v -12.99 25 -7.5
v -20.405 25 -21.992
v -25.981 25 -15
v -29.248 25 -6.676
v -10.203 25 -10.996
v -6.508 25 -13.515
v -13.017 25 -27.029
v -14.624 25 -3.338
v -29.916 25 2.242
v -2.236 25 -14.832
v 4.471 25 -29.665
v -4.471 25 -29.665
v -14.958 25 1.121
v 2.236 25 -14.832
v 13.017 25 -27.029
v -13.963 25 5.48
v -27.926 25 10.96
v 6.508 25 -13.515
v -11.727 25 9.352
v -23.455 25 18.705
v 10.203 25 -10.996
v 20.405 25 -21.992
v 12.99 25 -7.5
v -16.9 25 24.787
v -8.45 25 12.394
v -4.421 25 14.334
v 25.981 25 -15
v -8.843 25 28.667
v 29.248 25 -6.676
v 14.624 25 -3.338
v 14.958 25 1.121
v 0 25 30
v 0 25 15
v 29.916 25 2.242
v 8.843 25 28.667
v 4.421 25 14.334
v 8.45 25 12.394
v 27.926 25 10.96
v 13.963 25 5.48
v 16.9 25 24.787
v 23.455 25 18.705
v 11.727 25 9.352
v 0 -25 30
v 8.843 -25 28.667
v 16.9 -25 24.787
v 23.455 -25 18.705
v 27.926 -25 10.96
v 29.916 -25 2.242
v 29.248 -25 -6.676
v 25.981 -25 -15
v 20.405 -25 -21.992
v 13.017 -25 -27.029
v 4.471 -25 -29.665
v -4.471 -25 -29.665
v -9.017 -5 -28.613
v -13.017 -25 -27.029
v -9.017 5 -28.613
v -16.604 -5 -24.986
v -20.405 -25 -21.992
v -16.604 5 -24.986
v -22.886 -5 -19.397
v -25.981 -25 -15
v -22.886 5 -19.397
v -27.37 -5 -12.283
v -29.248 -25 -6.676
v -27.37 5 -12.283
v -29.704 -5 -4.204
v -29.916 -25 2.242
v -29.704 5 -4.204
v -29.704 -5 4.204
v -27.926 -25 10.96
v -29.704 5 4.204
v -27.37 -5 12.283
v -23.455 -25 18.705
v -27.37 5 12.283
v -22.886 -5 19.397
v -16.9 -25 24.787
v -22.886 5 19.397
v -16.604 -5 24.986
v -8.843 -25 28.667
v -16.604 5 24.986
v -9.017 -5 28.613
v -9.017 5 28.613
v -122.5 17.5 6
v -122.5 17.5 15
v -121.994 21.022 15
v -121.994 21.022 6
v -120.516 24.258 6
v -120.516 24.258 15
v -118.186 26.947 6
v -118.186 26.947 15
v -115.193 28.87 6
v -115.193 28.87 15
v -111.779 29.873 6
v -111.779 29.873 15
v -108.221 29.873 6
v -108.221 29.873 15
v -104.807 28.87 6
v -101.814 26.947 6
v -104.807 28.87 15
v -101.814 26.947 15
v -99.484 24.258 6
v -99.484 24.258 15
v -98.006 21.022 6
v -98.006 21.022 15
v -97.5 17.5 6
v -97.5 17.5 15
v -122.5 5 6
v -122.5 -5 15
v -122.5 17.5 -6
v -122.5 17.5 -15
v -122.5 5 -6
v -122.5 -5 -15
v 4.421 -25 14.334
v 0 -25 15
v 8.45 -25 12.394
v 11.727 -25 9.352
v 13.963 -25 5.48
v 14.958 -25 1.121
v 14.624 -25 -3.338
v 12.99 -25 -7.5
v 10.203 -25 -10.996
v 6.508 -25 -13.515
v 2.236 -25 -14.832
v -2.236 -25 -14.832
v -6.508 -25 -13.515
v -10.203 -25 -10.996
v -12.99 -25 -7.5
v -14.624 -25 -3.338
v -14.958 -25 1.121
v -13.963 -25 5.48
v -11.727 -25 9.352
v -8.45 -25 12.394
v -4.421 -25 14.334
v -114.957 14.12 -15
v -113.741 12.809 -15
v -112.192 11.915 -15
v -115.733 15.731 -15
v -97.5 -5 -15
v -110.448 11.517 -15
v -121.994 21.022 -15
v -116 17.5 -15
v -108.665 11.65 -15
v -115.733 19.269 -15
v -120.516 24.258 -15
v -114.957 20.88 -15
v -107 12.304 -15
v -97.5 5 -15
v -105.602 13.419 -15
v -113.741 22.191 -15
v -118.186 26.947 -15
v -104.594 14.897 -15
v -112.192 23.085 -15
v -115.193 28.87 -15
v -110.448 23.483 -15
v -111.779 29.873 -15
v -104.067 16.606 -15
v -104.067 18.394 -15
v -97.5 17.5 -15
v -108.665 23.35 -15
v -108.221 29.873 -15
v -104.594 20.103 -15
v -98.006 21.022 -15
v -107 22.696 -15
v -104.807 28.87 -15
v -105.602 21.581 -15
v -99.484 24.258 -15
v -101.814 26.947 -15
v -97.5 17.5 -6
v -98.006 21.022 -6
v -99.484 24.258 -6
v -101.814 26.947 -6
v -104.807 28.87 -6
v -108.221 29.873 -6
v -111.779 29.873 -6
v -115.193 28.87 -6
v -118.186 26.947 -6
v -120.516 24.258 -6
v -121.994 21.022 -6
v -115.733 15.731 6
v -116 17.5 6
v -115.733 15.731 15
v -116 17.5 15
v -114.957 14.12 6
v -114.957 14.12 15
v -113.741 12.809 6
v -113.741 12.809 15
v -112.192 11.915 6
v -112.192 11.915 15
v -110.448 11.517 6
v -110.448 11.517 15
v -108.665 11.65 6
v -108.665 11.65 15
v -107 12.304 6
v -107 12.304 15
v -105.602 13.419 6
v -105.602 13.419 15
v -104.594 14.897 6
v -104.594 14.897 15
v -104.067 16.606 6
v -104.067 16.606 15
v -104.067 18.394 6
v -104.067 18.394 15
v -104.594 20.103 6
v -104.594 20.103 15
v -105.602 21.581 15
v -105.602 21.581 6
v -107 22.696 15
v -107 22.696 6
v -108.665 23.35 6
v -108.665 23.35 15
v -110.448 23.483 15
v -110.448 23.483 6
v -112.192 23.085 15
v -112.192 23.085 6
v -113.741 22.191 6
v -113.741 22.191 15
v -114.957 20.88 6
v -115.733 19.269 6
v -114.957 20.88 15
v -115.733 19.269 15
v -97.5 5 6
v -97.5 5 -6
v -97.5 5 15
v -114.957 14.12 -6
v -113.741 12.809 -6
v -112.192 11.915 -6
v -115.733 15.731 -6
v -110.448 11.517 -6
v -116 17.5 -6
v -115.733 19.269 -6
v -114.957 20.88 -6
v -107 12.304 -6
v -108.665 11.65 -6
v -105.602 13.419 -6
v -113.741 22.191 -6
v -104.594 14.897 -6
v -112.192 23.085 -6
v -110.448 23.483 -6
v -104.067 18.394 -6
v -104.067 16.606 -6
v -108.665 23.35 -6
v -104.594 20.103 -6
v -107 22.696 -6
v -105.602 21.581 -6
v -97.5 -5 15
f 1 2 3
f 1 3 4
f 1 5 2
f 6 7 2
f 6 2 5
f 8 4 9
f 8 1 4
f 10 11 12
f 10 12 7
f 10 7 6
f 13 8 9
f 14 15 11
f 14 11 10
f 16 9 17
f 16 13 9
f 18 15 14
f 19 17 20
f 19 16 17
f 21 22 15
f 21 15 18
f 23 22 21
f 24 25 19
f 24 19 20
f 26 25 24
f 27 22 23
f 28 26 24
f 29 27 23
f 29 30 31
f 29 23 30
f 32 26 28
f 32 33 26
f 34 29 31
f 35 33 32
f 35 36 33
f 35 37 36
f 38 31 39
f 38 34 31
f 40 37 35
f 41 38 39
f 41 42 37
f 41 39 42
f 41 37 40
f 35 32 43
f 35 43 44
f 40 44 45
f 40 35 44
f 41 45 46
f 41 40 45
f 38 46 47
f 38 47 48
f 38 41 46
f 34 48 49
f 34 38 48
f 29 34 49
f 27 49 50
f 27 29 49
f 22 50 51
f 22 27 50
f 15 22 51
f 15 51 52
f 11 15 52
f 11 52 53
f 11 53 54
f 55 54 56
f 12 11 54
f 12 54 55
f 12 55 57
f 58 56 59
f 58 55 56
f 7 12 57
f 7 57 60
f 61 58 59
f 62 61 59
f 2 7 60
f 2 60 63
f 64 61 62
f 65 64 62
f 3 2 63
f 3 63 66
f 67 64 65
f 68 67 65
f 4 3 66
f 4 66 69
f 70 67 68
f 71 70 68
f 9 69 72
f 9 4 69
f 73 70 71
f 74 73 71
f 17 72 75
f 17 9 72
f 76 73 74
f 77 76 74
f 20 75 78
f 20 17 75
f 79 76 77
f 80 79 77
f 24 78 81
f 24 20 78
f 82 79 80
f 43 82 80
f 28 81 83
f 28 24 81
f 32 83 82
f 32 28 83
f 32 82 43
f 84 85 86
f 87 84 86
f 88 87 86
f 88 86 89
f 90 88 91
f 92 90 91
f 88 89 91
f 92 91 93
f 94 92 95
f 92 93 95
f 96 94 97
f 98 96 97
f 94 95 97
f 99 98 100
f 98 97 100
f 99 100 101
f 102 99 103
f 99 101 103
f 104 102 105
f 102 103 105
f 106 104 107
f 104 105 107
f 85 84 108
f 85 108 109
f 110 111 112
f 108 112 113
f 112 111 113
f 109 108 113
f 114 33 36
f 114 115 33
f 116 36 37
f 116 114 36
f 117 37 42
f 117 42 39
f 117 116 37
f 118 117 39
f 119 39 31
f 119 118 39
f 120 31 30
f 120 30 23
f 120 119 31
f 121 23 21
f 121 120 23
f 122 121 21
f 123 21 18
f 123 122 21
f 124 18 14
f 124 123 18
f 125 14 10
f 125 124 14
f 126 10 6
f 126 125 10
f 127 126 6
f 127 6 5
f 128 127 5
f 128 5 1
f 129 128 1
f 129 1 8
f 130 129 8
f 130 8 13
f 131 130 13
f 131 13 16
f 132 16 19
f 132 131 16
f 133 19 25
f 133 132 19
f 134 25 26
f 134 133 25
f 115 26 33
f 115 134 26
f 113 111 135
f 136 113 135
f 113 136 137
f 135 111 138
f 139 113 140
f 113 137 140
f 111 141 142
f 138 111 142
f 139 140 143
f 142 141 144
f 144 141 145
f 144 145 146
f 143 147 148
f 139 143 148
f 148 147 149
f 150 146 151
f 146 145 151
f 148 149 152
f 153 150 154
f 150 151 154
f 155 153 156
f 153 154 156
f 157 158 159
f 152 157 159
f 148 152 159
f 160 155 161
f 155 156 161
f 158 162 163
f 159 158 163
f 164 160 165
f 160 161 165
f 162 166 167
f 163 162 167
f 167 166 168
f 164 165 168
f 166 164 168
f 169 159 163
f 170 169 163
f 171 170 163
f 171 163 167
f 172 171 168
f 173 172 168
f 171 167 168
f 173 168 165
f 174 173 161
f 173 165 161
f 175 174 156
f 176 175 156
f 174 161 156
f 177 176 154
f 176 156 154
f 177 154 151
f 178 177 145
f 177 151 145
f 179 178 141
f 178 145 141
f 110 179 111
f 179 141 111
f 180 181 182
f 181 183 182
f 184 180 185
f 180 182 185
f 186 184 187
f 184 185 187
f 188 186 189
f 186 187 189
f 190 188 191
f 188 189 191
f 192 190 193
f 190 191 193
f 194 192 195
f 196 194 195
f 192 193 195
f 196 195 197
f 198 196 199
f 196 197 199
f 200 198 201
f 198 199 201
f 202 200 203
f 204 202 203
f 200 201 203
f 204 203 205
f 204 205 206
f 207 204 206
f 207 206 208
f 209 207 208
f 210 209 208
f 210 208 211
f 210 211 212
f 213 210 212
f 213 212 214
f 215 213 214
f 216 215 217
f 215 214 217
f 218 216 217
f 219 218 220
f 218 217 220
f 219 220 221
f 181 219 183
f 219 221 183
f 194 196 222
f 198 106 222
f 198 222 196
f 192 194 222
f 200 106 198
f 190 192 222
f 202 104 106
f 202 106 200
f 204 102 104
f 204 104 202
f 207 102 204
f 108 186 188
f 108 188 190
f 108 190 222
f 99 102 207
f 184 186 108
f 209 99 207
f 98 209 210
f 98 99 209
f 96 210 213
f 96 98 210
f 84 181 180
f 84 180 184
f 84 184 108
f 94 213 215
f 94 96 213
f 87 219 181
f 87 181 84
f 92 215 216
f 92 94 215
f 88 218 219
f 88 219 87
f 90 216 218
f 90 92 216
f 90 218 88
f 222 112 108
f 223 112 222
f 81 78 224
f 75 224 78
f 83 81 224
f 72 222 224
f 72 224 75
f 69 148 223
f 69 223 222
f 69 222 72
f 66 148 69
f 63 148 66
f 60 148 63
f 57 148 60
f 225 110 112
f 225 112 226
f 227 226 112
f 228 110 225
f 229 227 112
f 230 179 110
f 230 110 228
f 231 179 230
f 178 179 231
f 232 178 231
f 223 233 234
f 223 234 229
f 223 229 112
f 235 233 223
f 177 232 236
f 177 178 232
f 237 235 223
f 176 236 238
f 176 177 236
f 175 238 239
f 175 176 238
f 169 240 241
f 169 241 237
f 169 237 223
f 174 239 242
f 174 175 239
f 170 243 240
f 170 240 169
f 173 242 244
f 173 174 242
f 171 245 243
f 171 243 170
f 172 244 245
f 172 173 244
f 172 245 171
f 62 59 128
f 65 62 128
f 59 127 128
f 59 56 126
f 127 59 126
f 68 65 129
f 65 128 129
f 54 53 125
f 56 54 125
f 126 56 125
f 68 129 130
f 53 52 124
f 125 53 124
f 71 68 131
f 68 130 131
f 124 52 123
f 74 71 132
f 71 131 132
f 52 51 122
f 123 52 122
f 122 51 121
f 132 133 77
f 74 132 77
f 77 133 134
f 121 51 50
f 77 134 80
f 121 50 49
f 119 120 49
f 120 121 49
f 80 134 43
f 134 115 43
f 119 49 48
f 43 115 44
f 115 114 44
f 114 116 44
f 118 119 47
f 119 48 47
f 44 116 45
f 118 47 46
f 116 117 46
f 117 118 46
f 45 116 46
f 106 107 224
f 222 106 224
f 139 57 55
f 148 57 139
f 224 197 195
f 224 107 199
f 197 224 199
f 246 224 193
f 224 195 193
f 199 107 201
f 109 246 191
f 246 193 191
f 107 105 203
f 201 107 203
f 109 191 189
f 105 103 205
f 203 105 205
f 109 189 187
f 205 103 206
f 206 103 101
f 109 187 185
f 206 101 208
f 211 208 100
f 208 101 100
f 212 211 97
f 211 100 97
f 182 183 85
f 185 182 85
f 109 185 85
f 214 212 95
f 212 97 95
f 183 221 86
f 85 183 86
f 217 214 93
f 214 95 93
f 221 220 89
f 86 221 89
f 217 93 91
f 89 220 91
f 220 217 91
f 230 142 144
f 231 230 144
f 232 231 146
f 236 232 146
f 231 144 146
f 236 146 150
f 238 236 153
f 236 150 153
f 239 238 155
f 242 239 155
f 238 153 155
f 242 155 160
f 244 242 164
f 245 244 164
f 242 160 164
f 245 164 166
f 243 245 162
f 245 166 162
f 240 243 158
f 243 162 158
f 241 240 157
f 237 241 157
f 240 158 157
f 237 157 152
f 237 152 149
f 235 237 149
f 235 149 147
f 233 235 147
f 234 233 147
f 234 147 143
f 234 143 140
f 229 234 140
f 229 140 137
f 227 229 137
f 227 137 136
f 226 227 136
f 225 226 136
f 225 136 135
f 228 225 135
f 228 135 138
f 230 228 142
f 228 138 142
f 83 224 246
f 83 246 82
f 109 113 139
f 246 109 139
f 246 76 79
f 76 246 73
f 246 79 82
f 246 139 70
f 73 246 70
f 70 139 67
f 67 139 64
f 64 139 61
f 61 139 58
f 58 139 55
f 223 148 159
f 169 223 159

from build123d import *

# Parameters (mm, degrees)
SKETCH1_R           = 30
SKETCH1_R_2         = 15
BOSS_EXTRUDE2_DEPTH = 25
BOSS_EXTRUDE3_DEPTH = 5
BOSS_EXTRUDE5_DEPTH = 9
SKETCH6_R           = 6
BOSS_EXTRUDE6_DEPTH = 9
SKETCH7_R           = 6
CUT_EXTRUDE2_DEPTH  = 46


with BuildPart() as part:
    # Sketch1 → Boss-Extrude2 (new body, symmetric)
    with BuildSketch(Plane(origin=(0, 0, 0), x_dir=(1, 0, 0), z_dir=(0, 1, 0))):
        with Locations(Location((0, 0, 0), (0, 0, 270))):  # turned: the seam where the file's is
            Circle(SKETCH1_R)
        with Locations(Location((0, 0, 0), (0, 0, 270))):  # turned: the seam where the file's is
            Circle(SKETCH1_R_2, mode=Mode.SUBTRACT)
    extrude(amount=BOSS_EXTRUDE2_DEPTH, both=True)

    # Sketch3 → Boss-Extrude3 (add, symmetric)
    with BuildSketch(Plane(origin=(0, 0, 0), x_dir=(1, 0, 0), z_dir=(0, 1, 0))):
        with BuildLine():
            Line((-97.5, 15), (-122.5, 15))
            Line((-122.5, 15), (-122.5, -15))
            Line((-122.5, -15), (-97.5, -15))
            Line((-97.5, -15), (-9.01734104, -28.612716763))
            ThreePointArc((-9.01734104, -28.612716763), (-30, 0), (-9.01734104, 28.612716763))
            Line((-9.01734104, 28.612716763), (-97.5, 15))
        make_face()
    extrude(amount=BOSS_EXTRUDE3_DEPTH, both=True)

    # Sketch4 → Boss-Extrude5 (add)
    with BuildSketch(Plane.XY.offset(15)):
        with BuildLine():
            Line((-122.5, 5), (-122.5, 17.5))
            ThreePointArc((-122.5, 17.5), (-110, 30), (-97.5, 17.5))
            Line((-97.5, 17.5), (-97.5, 5))
            Line((-97.5, 5), (-97.5, -5))
            Line((-97.5, -5), (-122.5, -5))
            Line((-122.5, -5), (-122.5, 5))
        make_face()
    extrude(amount=-BOSS_EXTRUDE5_DEPTH)

    # Sketch6 → Boss-Extrude6 (add)
    with BuildSketch(Plane(origin=(0, 0, -15), x_dir=(-1, 0, 0), z_dir=(0, 0, -1))):
        with BuildLine():
            Line((97.5, 5), (97.5, 17.5))
            ThreePointArc((97.5, 17.5), (110, 30), (122.5, 17.5))
            Line((122.5, 17.5), (122.5, 5))
            Line((122.5, 5), (122.5, -5))
            Line((122.5, -5), (97.5, -5))
            Line((97.5, -5), (97.5, 5))
        make_face()
        with Locations((110, 17.5)):
            Circle(SKETCH6_R, mode=Mode.SUBTRACT)
    extrude(amount=-BOSS_EXTRUDE6_DEPTH)

    # Sketch7 → Cut-Extrude2 (cut, through all)
    with BuildSketch(Plane.XY.offset(15)):
        with Locations(Location((-110, 17.5, 0), (0, 0, 180))):  # turned: the seam where the file's is
            Circle(SKETCH7_R)
    extrude(amount=-CUT_EXTRUDE2_DEPTH, mode=Mode.SUBTRACT)


solid = part.part
